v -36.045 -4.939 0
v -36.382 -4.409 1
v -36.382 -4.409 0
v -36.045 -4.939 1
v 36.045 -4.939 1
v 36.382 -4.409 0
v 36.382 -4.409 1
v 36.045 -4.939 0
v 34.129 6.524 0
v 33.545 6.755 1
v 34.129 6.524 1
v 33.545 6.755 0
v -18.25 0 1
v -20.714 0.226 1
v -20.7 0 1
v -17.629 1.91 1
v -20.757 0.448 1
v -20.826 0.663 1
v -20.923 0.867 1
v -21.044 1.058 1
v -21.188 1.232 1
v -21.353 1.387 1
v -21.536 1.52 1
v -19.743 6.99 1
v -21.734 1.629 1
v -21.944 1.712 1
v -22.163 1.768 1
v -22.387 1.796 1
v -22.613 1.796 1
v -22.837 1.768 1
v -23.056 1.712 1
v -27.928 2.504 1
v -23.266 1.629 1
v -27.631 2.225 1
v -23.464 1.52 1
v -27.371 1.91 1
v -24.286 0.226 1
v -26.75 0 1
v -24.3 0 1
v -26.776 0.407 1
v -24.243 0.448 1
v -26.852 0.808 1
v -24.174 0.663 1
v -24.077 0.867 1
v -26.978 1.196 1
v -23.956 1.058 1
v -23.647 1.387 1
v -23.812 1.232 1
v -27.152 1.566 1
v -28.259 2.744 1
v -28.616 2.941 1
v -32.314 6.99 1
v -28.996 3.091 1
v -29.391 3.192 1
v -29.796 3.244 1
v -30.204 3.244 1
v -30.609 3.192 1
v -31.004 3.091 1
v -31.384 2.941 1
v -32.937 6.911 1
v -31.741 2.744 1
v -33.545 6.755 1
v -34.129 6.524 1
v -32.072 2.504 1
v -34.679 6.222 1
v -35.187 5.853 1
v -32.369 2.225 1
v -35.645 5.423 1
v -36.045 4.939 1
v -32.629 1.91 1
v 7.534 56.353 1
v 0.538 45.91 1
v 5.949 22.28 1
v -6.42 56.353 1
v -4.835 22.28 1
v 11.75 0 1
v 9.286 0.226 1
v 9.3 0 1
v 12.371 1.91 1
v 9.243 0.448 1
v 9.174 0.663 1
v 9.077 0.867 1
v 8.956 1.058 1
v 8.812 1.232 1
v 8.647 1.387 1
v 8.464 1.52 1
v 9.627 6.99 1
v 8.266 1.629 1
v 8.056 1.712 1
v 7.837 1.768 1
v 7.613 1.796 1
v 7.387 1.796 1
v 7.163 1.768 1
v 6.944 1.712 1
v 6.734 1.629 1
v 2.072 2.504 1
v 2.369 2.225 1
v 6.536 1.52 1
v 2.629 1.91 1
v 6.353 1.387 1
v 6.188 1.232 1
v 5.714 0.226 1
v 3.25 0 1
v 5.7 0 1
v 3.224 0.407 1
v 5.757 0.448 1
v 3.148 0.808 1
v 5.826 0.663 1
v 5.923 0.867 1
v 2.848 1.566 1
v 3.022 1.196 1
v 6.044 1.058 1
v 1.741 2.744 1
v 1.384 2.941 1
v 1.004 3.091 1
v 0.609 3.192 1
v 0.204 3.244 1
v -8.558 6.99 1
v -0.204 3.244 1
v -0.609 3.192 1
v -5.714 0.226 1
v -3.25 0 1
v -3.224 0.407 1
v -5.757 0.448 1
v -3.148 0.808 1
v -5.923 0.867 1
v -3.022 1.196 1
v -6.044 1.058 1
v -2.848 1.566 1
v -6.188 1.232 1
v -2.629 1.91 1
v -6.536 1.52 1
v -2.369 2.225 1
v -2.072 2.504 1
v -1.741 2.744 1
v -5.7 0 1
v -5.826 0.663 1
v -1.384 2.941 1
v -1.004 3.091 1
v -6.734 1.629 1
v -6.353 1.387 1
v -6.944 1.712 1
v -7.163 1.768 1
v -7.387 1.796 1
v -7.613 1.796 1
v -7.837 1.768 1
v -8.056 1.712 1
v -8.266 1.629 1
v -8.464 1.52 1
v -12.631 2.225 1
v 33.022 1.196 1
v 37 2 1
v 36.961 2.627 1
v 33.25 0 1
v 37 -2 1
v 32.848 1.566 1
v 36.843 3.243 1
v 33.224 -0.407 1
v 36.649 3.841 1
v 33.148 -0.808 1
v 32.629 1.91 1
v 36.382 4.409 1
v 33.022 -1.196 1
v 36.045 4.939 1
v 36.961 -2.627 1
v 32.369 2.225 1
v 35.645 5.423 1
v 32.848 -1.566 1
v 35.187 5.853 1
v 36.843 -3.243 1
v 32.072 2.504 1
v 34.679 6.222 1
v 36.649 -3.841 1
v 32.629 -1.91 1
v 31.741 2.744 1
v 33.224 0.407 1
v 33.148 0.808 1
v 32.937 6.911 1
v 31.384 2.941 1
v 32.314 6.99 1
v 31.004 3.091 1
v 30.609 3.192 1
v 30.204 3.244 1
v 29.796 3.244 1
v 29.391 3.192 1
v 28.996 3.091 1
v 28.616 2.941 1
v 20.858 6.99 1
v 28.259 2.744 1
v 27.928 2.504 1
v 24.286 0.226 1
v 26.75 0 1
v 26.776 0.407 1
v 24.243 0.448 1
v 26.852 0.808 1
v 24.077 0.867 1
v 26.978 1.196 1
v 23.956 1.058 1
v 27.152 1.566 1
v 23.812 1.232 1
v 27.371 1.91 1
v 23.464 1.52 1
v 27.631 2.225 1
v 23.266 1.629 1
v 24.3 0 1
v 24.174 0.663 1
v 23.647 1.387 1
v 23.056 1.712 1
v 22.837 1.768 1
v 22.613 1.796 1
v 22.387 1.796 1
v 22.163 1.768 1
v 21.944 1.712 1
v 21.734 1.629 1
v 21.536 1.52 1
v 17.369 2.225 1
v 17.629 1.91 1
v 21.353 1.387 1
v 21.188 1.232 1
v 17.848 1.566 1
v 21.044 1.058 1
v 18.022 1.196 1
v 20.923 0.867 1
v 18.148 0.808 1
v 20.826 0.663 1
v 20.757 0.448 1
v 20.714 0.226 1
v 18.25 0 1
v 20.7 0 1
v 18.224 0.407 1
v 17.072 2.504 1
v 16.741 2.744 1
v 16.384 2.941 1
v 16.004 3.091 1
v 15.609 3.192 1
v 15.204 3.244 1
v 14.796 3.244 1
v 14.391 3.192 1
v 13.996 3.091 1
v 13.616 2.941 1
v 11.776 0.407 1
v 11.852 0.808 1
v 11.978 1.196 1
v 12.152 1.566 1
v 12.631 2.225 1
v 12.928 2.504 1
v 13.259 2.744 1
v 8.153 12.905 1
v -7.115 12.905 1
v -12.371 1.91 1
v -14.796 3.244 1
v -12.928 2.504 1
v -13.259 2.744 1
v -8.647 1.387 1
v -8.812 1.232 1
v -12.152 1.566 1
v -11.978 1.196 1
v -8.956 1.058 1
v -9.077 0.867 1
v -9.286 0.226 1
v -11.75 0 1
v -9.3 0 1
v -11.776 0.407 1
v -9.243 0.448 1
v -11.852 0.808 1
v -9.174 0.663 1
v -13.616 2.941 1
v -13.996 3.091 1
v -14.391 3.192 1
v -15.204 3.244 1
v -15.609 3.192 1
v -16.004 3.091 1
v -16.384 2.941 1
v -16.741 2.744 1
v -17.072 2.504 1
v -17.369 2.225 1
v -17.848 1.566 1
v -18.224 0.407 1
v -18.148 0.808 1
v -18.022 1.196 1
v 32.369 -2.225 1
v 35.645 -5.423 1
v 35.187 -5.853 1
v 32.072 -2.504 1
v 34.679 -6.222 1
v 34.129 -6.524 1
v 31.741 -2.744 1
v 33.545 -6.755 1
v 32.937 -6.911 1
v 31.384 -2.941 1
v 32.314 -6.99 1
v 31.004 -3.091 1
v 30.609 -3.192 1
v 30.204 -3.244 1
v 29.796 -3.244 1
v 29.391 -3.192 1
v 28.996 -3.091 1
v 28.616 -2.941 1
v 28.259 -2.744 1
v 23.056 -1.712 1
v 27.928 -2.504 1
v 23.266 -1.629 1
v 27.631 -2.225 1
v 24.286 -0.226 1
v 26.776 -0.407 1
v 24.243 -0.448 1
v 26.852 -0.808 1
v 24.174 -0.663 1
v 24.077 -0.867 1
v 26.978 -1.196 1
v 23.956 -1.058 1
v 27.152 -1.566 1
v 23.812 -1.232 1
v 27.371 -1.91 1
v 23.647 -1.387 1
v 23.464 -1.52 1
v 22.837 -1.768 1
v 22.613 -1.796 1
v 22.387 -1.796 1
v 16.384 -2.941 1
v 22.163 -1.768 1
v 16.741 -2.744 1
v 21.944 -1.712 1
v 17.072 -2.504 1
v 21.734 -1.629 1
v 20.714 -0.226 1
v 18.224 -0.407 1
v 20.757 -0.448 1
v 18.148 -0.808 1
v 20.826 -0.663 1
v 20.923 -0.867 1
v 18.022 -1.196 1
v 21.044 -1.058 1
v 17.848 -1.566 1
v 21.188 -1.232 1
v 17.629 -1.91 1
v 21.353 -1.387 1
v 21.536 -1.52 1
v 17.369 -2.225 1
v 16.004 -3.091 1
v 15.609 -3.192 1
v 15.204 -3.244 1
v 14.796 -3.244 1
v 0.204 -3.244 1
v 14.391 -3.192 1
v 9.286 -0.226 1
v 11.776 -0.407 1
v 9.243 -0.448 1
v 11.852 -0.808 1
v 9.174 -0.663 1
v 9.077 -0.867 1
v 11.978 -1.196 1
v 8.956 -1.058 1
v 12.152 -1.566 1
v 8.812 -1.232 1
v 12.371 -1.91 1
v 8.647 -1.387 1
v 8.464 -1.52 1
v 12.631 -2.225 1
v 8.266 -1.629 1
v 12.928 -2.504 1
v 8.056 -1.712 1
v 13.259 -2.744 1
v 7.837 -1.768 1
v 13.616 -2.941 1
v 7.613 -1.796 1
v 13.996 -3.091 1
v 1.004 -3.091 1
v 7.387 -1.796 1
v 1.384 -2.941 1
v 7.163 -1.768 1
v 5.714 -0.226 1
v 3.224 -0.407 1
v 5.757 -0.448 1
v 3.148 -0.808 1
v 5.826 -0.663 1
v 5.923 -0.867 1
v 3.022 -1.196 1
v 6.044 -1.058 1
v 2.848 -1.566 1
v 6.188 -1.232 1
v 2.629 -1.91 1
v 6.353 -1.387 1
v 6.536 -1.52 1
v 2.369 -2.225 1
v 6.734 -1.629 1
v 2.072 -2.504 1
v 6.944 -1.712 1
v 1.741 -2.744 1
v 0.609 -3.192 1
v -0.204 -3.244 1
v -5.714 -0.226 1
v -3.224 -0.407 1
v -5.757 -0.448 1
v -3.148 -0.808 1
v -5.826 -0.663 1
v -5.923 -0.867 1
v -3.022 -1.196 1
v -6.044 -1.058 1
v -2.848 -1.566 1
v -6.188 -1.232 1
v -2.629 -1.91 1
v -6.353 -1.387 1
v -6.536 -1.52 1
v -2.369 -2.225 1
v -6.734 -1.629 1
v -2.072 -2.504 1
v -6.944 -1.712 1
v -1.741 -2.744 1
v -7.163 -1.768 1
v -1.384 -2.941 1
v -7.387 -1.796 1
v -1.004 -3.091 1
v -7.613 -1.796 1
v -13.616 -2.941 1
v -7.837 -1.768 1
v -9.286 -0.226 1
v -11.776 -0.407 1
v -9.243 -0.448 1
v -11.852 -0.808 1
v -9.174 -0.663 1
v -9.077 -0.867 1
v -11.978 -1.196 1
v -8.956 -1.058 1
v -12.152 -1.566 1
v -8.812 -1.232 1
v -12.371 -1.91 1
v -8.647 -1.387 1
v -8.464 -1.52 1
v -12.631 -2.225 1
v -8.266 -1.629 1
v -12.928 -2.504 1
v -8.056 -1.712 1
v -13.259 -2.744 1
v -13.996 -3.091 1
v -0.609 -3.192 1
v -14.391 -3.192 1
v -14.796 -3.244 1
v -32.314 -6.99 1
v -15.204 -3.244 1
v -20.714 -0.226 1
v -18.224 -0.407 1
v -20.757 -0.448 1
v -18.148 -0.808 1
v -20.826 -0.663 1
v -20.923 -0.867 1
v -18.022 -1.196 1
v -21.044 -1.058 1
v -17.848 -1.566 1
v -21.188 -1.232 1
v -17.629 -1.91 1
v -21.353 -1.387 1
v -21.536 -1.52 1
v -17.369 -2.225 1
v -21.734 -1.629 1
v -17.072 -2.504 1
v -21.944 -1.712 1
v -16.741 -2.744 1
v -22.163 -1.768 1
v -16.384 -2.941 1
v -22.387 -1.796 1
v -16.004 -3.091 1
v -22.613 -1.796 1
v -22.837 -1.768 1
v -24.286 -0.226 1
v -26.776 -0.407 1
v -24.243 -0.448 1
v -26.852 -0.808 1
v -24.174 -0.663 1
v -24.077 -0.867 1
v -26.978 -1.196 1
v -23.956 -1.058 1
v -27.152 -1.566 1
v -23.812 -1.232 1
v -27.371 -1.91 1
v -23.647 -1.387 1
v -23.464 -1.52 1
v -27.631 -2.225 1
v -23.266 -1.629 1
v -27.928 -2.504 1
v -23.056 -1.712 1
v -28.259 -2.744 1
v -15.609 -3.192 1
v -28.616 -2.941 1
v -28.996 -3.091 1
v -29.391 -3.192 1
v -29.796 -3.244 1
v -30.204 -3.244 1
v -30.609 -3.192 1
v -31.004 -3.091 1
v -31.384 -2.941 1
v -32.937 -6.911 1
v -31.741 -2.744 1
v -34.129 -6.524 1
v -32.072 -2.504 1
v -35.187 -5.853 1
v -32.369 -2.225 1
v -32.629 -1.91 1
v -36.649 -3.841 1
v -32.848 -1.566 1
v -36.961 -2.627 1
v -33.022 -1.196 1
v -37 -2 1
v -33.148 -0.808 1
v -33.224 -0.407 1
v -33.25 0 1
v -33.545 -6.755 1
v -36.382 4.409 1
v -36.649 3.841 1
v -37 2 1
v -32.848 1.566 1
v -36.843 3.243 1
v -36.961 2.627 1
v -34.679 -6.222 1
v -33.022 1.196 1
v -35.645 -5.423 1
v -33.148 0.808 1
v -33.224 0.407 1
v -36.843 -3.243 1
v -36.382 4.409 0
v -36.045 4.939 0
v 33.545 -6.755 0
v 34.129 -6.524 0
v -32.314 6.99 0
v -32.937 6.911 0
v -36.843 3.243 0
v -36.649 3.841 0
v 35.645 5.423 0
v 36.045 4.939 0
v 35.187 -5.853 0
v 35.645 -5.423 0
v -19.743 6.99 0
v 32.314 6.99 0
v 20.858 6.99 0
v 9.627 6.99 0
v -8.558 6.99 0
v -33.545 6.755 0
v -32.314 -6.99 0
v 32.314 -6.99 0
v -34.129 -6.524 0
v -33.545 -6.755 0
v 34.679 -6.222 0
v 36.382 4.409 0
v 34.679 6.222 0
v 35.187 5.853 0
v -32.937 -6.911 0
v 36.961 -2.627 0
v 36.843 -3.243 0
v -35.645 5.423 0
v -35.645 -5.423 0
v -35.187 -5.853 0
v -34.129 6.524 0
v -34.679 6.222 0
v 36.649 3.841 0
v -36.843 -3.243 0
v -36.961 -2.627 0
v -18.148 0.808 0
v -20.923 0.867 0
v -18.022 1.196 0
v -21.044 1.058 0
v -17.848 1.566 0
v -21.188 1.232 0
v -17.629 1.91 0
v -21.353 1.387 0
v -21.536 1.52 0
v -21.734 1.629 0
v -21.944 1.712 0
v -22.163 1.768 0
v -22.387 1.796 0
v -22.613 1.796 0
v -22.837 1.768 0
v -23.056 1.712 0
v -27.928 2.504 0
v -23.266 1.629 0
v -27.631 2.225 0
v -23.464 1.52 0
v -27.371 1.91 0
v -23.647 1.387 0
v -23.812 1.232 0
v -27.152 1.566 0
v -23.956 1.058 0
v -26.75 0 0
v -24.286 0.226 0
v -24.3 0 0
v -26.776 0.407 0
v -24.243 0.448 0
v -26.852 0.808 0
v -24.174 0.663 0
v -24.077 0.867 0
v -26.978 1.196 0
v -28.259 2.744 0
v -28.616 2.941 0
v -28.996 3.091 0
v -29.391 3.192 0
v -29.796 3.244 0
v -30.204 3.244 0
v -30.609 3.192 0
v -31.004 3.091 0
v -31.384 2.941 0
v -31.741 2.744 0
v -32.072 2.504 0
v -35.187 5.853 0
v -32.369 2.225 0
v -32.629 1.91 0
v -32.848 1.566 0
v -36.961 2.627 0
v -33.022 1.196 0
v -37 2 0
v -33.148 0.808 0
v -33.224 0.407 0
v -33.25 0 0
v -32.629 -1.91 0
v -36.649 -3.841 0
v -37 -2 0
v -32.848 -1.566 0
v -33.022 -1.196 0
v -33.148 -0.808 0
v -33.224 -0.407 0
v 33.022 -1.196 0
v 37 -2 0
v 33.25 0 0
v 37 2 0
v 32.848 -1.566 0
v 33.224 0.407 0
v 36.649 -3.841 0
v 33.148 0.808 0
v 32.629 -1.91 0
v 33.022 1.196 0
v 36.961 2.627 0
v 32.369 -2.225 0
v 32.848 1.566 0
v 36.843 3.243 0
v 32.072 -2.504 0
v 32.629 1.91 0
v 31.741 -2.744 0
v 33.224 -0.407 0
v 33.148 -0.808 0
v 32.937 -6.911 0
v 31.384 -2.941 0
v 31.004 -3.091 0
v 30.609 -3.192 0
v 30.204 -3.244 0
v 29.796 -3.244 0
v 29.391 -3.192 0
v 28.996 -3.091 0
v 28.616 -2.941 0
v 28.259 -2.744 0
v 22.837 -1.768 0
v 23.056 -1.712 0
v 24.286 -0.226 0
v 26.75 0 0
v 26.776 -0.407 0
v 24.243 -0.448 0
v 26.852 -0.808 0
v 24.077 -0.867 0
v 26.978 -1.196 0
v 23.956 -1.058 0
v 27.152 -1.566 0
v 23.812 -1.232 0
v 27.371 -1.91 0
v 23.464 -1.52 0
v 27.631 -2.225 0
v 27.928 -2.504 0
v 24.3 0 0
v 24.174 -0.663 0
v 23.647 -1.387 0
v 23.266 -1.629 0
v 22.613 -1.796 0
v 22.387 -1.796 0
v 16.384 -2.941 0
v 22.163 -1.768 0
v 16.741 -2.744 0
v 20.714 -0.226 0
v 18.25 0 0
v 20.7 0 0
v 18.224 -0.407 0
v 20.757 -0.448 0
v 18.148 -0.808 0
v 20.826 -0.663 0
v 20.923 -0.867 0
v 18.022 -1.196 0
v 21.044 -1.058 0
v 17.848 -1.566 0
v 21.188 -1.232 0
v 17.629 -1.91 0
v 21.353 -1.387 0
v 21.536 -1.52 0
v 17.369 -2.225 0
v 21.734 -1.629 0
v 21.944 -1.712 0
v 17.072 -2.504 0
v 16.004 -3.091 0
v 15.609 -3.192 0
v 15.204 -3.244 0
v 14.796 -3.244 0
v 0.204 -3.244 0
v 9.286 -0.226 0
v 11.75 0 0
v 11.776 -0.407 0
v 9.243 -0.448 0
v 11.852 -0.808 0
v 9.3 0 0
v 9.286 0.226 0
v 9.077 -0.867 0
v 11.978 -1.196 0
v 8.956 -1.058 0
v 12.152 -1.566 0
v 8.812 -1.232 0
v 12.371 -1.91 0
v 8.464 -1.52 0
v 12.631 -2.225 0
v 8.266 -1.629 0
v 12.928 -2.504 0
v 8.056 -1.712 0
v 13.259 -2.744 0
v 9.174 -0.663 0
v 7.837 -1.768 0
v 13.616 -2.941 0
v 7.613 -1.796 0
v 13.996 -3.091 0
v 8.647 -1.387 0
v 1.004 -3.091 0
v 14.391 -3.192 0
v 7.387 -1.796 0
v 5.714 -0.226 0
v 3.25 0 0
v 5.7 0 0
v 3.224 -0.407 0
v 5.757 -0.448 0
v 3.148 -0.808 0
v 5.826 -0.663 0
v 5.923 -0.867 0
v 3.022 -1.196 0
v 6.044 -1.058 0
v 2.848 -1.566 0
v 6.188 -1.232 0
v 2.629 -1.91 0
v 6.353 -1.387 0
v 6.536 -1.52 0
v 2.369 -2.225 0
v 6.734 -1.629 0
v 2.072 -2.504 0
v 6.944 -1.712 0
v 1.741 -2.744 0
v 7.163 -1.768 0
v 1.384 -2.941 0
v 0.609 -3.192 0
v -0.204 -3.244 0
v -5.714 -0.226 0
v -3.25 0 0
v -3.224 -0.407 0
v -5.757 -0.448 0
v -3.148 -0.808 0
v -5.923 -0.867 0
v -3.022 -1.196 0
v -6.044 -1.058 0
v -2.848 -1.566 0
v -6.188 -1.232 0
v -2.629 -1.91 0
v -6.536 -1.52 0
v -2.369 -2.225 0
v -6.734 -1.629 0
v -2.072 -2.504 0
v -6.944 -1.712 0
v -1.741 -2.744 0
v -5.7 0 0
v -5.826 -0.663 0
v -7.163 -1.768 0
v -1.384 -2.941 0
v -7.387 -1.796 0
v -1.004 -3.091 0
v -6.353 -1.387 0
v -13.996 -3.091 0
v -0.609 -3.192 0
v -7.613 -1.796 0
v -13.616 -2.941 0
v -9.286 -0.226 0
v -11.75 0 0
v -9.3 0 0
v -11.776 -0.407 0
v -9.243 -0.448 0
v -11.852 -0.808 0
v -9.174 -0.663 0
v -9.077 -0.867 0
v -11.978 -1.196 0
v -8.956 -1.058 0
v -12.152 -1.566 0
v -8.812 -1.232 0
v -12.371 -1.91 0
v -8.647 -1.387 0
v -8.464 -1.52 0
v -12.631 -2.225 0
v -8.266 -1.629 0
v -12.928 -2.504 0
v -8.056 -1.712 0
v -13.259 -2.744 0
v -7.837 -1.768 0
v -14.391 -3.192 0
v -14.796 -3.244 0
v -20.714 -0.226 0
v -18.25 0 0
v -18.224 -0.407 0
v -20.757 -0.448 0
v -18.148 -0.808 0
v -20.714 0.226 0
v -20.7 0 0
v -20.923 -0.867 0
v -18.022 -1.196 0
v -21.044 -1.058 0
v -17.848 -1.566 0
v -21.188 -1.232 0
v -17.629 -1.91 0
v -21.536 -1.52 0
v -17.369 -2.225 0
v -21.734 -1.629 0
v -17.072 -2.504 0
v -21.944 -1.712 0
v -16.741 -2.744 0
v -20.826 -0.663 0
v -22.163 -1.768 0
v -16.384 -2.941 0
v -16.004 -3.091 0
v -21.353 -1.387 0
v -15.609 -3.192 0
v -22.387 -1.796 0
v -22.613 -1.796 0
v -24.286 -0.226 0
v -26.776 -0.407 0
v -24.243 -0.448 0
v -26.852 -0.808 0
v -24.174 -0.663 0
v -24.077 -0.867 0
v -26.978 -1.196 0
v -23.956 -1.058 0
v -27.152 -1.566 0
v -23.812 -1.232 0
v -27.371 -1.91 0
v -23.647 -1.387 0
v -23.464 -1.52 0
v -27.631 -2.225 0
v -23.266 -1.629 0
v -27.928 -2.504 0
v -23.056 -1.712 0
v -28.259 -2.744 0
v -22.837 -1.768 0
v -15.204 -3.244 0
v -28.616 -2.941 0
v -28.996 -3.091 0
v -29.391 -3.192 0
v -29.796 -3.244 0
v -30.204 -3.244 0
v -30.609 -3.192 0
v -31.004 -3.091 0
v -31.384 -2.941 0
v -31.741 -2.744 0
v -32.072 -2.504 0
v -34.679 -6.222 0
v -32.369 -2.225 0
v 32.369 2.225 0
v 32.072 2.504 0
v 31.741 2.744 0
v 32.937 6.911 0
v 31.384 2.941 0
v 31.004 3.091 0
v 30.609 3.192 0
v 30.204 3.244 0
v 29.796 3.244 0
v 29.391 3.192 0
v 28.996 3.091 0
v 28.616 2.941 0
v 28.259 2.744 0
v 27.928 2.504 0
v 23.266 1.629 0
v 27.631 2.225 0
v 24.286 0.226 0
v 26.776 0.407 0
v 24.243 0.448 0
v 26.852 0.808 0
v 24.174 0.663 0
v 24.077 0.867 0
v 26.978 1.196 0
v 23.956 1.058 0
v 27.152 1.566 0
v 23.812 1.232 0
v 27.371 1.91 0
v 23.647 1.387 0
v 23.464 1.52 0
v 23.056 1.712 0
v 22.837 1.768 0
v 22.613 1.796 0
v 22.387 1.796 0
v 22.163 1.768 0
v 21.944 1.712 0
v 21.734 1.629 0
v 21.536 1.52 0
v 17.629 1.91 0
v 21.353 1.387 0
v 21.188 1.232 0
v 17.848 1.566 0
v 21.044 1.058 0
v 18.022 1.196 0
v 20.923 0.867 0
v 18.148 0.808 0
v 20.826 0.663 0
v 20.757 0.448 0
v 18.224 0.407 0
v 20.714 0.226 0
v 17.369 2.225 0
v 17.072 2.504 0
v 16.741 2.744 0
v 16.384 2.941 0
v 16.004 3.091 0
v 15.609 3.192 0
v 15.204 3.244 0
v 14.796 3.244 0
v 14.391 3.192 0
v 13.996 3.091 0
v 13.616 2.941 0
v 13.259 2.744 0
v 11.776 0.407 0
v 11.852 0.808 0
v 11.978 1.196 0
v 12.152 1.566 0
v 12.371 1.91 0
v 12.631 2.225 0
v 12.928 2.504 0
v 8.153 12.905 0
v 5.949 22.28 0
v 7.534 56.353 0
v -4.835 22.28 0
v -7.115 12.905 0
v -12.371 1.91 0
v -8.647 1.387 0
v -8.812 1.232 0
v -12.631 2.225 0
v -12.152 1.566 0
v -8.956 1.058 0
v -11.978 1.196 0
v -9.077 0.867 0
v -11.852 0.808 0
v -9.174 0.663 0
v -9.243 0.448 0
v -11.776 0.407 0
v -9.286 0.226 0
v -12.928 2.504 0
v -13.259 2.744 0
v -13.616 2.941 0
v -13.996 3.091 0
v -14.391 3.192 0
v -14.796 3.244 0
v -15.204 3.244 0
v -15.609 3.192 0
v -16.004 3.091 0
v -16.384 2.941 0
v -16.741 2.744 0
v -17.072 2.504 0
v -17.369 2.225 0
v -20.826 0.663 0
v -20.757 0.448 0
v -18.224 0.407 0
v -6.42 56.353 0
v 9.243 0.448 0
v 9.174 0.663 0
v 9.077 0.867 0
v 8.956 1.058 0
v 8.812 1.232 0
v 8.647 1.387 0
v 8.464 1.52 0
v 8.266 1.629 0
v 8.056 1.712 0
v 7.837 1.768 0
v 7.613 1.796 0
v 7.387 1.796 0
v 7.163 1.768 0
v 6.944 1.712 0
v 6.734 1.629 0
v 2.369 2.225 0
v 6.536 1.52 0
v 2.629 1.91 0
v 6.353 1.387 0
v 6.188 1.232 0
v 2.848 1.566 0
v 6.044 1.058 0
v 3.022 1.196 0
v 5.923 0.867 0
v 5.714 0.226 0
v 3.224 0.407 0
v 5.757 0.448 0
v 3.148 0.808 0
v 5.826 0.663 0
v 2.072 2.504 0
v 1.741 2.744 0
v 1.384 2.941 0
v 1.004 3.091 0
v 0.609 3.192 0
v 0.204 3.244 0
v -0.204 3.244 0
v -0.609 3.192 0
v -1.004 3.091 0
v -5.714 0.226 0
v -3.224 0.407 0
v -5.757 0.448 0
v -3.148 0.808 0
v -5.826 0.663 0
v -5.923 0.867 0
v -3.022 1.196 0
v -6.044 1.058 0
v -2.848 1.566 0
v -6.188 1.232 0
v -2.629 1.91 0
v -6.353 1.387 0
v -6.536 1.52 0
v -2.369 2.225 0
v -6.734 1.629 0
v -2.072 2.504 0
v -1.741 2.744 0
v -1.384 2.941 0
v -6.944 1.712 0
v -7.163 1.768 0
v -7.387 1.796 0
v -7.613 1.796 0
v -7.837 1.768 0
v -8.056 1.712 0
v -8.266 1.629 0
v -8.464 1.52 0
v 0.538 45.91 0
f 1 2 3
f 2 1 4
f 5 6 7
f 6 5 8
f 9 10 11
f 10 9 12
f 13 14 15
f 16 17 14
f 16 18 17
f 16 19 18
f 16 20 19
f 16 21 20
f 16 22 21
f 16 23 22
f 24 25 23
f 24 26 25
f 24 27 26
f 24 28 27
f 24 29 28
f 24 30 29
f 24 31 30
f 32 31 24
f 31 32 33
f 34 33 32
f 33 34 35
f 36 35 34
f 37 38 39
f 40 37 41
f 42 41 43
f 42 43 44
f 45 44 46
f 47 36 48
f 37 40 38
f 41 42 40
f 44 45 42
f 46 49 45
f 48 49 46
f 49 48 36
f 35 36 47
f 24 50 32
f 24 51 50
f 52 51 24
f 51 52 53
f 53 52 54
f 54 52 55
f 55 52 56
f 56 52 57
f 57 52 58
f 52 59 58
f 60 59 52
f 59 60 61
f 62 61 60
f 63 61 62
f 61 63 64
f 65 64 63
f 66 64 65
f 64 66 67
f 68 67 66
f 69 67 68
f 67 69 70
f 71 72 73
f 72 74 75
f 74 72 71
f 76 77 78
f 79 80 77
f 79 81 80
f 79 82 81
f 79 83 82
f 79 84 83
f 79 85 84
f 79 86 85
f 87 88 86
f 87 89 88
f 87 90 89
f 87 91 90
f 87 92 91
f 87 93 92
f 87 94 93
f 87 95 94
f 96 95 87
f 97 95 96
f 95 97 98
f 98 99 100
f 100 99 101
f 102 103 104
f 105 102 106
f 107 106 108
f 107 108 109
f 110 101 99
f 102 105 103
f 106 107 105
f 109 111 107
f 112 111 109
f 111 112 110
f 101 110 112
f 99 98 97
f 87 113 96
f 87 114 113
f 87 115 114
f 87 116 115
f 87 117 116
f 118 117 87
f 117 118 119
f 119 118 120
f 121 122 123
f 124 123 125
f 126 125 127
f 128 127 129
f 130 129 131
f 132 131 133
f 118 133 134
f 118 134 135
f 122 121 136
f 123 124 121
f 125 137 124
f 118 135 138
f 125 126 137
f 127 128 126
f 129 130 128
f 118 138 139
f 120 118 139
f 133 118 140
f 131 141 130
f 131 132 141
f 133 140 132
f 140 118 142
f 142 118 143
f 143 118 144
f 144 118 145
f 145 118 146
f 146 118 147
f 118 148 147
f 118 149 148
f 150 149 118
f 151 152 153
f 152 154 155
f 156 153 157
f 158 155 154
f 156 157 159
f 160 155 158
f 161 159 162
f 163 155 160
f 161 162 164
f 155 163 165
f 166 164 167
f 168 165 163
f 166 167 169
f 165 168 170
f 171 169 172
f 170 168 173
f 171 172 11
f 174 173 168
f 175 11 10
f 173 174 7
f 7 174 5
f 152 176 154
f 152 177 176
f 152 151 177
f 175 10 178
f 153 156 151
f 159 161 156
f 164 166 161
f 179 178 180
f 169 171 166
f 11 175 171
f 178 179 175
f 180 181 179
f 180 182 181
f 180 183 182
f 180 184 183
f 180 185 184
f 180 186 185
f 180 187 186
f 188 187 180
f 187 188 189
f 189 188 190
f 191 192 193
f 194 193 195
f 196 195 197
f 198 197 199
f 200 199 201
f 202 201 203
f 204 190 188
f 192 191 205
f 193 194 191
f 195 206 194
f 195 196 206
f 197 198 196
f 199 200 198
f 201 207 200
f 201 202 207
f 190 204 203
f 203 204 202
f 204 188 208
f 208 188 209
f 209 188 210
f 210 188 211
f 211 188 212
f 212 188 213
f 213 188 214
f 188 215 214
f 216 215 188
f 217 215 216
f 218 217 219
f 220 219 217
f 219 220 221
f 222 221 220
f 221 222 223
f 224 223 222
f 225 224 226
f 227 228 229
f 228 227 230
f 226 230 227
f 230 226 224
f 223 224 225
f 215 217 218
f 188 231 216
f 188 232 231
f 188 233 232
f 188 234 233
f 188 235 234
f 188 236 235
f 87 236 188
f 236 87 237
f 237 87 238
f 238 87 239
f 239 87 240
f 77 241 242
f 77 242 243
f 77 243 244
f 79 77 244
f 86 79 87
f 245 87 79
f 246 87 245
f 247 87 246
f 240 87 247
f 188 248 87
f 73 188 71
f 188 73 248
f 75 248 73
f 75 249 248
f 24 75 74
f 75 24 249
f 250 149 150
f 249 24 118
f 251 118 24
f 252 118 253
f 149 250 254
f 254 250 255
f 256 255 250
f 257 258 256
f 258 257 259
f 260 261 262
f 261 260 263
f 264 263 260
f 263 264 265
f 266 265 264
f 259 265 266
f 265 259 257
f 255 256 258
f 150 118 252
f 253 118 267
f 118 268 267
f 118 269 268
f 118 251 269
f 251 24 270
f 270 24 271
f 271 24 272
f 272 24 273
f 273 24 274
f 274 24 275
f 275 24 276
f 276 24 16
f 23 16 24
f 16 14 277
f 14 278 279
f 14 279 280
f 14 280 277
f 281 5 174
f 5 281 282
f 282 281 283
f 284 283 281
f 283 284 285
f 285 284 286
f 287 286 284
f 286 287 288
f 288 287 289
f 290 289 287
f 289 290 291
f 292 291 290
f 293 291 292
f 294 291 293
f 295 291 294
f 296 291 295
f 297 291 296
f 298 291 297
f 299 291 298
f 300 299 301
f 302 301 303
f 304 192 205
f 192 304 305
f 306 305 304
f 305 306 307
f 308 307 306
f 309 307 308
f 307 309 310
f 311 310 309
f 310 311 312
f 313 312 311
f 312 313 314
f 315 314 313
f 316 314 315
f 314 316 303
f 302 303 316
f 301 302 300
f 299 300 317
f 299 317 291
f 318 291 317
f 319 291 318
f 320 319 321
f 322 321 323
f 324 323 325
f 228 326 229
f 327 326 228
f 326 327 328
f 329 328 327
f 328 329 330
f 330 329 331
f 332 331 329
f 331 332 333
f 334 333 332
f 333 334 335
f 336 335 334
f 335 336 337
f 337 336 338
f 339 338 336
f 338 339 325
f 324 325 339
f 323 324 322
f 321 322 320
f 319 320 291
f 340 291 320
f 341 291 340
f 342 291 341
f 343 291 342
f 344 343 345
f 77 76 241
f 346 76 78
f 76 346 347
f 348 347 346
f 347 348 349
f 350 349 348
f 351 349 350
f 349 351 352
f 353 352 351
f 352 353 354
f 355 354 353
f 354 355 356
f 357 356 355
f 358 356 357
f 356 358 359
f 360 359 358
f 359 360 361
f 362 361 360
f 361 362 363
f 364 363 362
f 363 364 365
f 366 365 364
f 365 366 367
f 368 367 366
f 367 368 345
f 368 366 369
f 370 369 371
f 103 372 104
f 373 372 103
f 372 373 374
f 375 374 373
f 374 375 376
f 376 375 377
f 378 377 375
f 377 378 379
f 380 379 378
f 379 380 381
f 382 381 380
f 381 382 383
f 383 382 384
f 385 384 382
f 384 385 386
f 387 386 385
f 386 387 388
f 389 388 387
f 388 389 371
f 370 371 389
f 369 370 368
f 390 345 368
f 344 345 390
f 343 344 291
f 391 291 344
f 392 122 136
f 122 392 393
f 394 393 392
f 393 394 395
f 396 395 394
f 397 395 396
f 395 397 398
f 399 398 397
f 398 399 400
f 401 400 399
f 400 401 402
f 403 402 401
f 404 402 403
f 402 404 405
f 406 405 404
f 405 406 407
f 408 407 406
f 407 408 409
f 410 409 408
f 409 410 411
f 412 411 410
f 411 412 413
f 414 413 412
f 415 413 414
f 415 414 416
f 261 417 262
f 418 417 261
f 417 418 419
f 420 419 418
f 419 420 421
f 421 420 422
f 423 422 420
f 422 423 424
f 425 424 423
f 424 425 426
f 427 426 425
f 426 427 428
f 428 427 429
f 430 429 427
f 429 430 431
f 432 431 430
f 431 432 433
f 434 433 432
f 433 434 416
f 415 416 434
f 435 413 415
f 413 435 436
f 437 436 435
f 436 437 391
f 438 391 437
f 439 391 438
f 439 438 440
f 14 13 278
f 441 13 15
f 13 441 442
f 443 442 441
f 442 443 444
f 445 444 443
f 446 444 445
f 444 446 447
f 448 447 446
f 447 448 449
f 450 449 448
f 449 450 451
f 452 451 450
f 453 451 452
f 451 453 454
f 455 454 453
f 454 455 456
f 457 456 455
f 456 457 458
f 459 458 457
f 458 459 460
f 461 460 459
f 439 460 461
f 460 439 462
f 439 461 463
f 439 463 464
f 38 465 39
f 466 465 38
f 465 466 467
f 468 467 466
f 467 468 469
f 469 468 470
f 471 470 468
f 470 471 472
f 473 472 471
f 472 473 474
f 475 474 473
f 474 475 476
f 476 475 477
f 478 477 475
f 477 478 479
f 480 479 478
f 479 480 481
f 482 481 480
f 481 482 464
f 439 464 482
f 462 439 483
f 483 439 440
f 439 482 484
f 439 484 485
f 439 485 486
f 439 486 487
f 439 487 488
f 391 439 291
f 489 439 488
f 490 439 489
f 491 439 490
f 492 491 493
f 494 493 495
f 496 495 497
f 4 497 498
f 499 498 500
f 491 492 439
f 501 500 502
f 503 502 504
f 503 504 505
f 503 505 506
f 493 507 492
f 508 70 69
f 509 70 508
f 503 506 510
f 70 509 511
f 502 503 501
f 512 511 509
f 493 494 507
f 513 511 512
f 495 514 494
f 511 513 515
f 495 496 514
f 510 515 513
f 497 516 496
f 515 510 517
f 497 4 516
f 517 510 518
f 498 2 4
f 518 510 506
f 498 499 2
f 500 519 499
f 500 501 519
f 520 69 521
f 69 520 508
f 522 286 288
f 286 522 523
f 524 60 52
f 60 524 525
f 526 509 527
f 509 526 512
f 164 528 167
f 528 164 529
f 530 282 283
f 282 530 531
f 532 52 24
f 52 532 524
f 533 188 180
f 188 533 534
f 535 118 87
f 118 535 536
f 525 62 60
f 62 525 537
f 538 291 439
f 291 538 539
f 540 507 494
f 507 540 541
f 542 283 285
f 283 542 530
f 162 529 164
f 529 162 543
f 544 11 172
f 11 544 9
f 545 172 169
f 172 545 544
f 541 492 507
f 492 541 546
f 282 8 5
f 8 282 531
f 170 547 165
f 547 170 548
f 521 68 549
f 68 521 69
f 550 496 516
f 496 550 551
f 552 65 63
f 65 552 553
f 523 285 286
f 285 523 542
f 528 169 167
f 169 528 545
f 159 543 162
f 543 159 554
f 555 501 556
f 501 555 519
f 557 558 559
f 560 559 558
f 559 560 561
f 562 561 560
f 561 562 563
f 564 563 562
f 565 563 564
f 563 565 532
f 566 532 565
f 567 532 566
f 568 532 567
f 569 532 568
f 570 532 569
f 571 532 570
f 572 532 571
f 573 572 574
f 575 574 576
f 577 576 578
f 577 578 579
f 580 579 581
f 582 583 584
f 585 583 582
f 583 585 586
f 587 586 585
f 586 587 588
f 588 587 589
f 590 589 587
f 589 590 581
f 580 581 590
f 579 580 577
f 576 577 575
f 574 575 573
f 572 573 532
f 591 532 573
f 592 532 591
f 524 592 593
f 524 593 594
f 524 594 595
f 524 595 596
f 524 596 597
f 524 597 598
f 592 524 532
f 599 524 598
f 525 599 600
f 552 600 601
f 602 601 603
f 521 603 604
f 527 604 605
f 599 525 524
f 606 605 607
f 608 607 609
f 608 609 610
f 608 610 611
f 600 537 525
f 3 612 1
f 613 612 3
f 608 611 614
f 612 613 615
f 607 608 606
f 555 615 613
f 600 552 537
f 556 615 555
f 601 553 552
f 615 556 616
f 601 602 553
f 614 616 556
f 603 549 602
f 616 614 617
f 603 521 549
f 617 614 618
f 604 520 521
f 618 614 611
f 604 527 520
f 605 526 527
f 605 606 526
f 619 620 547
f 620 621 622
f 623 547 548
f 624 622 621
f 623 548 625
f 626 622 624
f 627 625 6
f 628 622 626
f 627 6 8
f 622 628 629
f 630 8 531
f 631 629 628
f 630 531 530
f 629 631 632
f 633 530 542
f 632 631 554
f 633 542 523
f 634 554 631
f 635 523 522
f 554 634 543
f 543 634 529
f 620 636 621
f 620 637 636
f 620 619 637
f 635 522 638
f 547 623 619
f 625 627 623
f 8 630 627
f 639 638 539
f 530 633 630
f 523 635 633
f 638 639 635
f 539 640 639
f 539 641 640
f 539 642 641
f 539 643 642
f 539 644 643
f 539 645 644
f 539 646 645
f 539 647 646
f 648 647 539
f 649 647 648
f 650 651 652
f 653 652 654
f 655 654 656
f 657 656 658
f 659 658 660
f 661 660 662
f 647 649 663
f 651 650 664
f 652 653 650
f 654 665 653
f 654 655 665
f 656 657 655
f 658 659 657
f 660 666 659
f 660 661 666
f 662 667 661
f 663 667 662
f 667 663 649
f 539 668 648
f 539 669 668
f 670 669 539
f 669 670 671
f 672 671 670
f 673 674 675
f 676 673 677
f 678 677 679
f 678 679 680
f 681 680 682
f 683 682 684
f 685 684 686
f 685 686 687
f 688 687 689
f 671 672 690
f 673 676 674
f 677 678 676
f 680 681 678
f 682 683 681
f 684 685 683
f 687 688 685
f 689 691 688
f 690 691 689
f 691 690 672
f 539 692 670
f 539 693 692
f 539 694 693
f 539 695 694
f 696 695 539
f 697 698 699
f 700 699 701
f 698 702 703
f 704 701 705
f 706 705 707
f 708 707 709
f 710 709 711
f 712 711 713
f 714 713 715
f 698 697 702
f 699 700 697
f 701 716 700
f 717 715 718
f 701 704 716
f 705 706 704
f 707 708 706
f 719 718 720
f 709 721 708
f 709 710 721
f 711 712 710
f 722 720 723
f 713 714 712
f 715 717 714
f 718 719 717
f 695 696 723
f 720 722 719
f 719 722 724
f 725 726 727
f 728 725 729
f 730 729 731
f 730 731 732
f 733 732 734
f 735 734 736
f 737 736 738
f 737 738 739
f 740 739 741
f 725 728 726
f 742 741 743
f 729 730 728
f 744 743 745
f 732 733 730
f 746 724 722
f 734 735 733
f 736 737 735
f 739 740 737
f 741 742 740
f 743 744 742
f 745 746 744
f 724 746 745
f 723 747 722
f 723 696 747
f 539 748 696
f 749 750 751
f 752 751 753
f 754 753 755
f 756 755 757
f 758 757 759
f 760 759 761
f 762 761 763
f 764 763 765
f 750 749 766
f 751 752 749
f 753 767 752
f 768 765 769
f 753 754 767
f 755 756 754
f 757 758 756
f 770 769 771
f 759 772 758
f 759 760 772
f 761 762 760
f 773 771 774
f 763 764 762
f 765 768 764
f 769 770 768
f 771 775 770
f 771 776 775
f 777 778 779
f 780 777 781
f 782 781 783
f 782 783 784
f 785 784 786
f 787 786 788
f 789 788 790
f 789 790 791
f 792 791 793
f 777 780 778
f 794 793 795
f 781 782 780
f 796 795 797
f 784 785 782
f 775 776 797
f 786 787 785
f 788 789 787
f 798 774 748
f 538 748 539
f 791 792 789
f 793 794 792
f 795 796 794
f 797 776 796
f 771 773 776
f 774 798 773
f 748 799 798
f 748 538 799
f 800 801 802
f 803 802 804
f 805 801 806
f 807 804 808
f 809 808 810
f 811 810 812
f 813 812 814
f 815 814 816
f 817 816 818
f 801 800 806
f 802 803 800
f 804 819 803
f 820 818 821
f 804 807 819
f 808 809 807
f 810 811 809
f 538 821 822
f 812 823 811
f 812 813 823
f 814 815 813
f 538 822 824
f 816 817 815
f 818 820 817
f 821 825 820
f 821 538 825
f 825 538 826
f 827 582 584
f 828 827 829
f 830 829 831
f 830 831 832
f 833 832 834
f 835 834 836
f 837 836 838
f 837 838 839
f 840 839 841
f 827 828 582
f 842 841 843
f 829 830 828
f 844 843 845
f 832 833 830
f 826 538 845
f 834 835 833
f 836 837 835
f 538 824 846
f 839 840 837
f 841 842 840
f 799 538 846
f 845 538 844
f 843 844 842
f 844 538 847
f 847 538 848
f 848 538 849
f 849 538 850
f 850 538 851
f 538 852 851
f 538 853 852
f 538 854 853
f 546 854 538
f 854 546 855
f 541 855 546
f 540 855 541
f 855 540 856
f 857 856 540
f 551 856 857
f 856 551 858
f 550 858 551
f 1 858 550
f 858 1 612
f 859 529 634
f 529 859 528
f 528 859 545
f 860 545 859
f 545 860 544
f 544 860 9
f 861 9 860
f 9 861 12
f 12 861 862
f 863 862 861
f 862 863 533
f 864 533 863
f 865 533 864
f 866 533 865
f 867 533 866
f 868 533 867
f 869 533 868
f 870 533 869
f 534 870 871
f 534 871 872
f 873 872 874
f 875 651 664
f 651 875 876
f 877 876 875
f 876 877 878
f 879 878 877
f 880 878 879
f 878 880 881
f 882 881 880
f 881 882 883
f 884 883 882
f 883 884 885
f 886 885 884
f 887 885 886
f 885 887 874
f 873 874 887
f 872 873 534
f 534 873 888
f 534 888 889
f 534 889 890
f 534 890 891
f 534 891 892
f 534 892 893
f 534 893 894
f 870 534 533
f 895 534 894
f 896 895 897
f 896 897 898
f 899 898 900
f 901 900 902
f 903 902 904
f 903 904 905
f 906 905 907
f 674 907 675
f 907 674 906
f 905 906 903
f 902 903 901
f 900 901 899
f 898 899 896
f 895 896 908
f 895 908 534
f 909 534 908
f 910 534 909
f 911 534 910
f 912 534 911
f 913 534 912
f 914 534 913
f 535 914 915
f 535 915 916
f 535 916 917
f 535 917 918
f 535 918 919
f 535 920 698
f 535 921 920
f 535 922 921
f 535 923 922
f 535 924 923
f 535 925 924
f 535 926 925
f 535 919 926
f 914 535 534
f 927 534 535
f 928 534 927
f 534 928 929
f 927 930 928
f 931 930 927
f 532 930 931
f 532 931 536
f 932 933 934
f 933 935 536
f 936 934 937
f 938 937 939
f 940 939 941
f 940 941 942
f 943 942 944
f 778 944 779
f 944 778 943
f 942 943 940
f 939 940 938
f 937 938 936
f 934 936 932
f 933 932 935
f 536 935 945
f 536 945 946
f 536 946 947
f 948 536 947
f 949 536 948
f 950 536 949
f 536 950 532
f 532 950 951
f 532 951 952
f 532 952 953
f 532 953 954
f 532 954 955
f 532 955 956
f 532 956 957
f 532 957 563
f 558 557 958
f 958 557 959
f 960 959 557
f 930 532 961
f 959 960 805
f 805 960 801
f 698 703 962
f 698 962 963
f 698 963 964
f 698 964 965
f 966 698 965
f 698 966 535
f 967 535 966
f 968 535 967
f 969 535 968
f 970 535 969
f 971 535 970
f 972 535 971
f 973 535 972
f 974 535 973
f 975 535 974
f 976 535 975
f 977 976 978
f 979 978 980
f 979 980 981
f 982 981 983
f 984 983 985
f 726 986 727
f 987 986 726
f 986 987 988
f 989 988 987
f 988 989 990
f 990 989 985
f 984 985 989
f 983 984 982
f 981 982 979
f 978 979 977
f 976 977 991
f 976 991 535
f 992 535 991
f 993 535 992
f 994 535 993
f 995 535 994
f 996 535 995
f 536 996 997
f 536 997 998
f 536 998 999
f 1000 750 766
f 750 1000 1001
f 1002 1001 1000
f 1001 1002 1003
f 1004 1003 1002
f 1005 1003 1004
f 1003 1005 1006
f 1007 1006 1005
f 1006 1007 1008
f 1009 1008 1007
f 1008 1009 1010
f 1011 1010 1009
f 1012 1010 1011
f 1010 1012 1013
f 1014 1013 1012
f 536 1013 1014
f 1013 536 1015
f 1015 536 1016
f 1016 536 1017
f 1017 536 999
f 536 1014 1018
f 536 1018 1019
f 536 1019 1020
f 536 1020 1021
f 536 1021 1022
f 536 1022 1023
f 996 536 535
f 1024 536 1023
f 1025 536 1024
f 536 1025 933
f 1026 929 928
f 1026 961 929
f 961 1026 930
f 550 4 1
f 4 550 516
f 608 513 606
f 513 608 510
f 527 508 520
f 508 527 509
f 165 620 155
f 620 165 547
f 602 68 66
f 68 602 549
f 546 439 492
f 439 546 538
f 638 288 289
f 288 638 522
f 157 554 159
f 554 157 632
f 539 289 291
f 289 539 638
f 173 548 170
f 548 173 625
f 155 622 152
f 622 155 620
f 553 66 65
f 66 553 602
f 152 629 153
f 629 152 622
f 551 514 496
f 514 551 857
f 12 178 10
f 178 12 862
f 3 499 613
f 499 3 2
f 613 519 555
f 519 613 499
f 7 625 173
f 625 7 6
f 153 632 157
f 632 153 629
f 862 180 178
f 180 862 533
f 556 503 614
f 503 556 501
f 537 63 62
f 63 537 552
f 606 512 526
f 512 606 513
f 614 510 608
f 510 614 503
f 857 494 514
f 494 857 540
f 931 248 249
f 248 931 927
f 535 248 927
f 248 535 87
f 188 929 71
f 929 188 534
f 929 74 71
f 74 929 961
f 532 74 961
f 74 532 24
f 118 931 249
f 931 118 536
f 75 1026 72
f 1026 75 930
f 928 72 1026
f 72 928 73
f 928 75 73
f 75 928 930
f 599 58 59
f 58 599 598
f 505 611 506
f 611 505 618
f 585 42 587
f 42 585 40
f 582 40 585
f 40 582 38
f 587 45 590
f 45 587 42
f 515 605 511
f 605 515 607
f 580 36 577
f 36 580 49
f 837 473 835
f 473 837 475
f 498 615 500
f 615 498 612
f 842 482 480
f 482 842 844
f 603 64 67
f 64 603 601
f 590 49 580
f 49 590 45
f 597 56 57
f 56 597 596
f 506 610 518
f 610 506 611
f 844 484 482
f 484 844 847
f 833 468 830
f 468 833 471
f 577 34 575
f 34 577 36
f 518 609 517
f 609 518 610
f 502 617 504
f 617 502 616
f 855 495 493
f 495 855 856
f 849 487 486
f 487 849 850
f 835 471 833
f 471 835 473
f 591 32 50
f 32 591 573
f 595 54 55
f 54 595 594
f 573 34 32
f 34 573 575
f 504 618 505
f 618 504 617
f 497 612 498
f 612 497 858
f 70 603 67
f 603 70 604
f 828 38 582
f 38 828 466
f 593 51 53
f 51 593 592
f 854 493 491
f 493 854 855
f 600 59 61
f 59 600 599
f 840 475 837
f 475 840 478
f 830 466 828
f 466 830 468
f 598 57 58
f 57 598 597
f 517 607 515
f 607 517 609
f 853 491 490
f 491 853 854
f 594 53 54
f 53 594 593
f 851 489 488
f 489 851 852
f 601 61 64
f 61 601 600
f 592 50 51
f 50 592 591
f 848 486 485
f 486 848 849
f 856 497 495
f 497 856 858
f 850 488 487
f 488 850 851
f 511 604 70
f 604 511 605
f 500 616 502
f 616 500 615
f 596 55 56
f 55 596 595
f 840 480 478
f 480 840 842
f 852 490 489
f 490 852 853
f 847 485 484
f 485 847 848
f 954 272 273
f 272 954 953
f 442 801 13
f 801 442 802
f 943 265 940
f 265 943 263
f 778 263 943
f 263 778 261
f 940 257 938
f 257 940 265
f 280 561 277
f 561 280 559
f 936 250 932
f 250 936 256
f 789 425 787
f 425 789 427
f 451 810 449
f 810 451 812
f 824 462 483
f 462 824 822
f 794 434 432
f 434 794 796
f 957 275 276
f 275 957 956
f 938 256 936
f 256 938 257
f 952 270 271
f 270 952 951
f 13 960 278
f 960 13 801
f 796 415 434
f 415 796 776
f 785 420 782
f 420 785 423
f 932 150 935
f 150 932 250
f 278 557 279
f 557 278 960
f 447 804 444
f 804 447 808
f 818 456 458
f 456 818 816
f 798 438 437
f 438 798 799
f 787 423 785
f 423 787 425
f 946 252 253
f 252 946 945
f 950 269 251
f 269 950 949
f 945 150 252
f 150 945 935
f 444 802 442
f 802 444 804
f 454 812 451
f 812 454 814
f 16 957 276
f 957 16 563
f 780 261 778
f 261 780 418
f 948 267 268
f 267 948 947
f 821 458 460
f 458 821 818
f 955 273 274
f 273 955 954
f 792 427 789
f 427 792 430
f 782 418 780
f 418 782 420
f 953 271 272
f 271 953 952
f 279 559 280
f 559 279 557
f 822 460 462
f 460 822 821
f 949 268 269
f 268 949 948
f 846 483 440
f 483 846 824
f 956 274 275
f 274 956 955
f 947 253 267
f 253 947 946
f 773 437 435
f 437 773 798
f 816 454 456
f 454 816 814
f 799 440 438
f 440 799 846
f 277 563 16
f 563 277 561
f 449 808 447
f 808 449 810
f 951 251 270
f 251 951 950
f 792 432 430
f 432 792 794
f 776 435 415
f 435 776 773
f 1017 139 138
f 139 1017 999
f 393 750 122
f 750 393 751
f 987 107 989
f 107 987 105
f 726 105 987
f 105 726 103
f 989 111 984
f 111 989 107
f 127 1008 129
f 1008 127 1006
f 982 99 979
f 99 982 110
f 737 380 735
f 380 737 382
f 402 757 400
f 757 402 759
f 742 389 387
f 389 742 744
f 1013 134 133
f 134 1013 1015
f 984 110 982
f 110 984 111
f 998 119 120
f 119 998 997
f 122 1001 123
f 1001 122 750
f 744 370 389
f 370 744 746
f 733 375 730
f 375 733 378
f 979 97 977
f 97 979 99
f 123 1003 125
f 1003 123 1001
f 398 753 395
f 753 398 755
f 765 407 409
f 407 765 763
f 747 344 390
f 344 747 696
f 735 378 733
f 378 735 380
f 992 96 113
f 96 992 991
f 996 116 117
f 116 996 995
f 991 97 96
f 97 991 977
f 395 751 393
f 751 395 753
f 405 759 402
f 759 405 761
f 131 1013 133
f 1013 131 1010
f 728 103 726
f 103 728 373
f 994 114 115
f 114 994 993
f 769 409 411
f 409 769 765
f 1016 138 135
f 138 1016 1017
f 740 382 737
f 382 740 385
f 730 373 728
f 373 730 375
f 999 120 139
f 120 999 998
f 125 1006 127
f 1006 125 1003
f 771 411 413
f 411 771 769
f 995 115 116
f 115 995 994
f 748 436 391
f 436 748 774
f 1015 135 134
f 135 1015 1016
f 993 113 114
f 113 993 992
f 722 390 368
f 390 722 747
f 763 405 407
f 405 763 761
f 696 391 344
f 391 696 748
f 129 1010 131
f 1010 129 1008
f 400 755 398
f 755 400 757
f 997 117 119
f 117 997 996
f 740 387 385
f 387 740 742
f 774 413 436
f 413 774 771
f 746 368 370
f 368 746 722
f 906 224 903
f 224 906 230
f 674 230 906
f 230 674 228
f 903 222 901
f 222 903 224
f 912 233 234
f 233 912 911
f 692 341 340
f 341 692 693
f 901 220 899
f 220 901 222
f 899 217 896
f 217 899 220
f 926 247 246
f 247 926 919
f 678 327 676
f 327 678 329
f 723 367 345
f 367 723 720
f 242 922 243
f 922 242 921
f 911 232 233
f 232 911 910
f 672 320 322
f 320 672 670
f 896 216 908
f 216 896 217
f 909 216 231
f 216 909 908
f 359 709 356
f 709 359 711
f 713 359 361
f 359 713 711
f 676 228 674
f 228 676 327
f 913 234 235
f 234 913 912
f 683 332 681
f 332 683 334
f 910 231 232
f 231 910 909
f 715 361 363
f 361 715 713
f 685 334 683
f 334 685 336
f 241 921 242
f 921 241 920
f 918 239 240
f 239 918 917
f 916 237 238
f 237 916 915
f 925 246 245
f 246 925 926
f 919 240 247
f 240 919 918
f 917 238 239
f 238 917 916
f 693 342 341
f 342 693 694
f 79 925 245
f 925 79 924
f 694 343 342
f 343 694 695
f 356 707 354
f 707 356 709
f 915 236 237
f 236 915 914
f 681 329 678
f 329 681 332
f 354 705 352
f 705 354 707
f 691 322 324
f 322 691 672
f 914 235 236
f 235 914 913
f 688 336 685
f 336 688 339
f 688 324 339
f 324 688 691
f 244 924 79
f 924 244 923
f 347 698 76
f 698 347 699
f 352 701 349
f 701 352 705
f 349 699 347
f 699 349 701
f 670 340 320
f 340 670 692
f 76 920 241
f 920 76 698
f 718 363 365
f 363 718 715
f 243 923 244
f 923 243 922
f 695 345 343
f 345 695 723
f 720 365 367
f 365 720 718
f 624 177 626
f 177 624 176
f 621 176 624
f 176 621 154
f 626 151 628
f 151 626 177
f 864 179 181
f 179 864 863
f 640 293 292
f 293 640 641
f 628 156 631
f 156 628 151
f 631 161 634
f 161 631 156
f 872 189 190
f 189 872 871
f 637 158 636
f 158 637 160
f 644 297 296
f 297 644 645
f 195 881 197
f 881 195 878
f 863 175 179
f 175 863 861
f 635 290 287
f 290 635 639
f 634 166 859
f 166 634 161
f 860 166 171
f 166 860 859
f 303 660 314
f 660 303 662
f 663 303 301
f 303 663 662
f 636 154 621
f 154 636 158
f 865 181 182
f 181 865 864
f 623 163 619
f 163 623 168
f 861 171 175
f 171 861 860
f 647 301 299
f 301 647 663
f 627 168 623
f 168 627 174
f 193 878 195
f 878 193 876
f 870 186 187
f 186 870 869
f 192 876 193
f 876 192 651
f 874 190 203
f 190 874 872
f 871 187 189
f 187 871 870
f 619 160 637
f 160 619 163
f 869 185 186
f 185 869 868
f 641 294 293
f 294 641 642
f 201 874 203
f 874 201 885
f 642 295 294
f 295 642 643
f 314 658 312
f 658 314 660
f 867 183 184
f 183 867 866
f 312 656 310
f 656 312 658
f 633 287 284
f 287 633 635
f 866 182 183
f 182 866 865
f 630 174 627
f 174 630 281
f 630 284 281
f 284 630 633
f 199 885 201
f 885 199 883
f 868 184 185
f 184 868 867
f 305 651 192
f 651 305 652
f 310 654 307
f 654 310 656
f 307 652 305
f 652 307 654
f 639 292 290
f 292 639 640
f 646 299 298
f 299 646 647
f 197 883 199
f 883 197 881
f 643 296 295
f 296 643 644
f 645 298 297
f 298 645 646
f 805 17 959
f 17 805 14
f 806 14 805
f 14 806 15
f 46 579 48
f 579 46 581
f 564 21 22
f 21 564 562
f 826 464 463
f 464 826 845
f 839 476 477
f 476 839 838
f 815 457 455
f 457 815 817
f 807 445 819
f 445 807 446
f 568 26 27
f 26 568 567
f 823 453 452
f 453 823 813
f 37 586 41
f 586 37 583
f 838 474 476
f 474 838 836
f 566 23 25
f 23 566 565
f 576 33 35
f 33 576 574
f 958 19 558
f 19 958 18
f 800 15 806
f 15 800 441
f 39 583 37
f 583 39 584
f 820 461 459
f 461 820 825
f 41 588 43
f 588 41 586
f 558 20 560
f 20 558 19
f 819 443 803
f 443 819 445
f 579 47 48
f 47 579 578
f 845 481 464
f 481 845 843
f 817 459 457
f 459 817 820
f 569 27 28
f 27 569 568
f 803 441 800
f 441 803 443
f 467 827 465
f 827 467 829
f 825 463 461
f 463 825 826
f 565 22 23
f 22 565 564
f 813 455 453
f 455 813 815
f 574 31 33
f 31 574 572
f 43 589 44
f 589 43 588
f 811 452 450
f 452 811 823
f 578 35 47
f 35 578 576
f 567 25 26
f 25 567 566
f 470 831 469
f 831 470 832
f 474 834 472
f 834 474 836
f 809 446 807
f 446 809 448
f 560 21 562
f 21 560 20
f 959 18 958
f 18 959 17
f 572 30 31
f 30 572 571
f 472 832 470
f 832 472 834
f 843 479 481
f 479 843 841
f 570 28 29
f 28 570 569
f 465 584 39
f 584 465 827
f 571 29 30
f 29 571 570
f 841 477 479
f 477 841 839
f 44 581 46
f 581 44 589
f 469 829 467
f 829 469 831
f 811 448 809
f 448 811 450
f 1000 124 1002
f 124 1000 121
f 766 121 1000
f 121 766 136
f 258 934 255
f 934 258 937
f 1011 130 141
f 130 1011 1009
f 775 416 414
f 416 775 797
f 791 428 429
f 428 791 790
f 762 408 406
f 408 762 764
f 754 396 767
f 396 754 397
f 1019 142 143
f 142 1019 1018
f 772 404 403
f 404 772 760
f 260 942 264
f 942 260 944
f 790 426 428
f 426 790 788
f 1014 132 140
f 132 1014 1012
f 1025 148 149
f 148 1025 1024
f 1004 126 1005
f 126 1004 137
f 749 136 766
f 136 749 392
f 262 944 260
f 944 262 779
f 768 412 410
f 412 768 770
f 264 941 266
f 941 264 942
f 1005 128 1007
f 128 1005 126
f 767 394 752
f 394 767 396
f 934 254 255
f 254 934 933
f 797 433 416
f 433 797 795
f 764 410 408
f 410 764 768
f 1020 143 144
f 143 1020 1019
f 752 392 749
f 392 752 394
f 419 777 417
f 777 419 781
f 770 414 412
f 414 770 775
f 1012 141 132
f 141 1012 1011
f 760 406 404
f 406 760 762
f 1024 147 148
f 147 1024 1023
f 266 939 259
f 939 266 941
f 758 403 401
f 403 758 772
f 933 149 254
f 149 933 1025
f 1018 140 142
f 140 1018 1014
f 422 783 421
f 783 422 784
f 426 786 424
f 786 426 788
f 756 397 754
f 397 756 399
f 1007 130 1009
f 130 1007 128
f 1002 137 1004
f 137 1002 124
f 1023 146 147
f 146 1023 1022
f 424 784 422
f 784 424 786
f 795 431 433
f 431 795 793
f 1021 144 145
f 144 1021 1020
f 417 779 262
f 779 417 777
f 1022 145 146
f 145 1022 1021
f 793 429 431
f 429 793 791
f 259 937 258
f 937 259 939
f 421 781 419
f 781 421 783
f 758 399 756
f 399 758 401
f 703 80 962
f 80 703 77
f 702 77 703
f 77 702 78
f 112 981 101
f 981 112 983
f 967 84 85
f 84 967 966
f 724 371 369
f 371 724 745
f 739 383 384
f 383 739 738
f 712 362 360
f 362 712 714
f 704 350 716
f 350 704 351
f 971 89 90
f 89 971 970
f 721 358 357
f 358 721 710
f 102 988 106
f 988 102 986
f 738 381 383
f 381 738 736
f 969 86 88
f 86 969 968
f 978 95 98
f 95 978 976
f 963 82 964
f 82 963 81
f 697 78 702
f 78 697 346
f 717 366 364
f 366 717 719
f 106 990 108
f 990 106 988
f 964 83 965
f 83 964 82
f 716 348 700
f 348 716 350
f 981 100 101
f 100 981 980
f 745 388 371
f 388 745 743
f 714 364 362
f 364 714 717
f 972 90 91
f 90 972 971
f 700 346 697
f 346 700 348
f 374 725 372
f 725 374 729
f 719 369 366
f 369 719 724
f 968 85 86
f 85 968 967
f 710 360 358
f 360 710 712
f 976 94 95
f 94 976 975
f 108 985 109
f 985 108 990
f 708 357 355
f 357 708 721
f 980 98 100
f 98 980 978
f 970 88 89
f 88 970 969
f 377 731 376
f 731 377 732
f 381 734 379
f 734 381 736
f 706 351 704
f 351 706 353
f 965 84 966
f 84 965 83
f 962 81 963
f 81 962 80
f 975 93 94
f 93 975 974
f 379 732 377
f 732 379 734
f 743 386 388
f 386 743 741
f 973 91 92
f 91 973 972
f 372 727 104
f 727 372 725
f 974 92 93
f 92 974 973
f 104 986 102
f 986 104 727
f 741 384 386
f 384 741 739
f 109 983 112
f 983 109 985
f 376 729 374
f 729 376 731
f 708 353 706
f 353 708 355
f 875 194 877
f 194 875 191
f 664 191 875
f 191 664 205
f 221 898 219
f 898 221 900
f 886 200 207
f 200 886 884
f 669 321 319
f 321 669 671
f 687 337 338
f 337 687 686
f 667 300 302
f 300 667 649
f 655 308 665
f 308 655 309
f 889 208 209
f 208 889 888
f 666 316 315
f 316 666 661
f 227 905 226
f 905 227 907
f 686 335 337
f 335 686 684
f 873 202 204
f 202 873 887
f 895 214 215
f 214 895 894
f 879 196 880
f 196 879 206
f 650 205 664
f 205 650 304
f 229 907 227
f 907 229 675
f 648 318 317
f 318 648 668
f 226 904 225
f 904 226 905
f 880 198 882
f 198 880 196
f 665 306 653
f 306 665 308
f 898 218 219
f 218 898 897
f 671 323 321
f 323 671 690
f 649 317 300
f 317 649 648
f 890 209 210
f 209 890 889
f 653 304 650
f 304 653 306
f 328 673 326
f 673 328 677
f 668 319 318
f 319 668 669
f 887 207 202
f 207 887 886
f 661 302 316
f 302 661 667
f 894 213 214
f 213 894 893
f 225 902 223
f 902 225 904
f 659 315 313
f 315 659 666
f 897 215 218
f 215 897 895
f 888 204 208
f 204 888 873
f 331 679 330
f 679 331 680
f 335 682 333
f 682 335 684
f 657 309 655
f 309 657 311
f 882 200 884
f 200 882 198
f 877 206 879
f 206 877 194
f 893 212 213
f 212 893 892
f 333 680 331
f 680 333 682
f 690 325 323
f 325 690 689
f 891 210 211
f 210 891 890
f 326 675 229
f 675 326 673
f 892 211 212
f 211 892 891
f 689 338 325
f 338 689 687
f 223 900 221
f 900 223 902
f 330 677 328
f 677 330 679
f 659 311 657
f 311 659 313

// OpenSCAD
$fn = 50;


difference() {
	union() {
		hull() {
			translate(v = [-32.0000000000, 2.0000000000, 0]) {
				cylinder(h = 1, r = 5);
			}
			translate(v = [32.0000000000, 2.0000000000, 0]) {
				cylinder(h = 1, r = 5);
			}
			translate(v = [-32.0000000000, -2.0000000000, 0]) {
				cylinder(h = 1, r = 5);
			}
			translate(v = [32.0000000000, -2.0000000000, 0]) {
				cylinder(h = 1, r = 5);
			}
		}
		translate(v = [0, 55, 0]) {
			linear_extrude(height = 1) {
				text(font = "DejaVu Sans Mono:style=Bold", halign = "center", size = 57.0000000000, text = "A", valign = "top");
			}
		}
	}
	union() {
		translate(v = [-30.0000000000, 0.0000000000, 0]) {
			translate(v = [0, 0, -100]) {
				cylinder(h = 200, r = 3.2500000000);
			}
		}
		translate(v = [-15.0000000000, 0.0000000000, 0]) {
			translate(v = [0, 0, -100]) {
				cylinder(h = 200, r = 3.2500000000);
			}
		}
		translate(v = [0, 0, -100]) {
			cylinder(h = 200, r = 3.2500000000);
		}
		translate(v = [15.0000000000, 0.0000000000, 0]) {
			translate(v = [0, 0, -100]) {
				cylinder(h = 200, r = 3.2500000000);
			}
		}
		translate(v = [30.0000000000, 0.0000000000, 0]) {
			translate(v = [0, 0, -100]) {
				cylinder(h = 200, r = 3.2500000000);
			}
		}
		translate(v = [-30.0000000000, 0.0000000000, 0]) {
			translate(v = [0, 0, -100]) {
				cylinder(h = 200, r = 1.8000000000);
			}
		}
		translate(v = [-22.5000000000, 0.0000000000, 0]) {
			translate(v = [0, 0, -100]) {
				cylinder(h = 200, r = 1.8000000000);
			}
		}
		translate(v = [-15.0000000000, 0.0000000000, 0]) {
			translate(v = [0, 0, -100]) {
				cylinder(h = 200, r = 1.8000000000);
			}
		}
		translate(v = [-7.5000000000, 0.0000000000, 0]) {
			translate(v = [0, 0, -100]) {
				cylinder(h = 200, r = 1.8000000000);
			}
		}
		translate(v = [0, 0, -100]) {
			cylinder(h = 200, r = 1.8000000000);
		}
		translate(v = [7.5000000000, 0.0000000000, 0]) {
			translate(v = [0, 0, -100]) {
				cylinder(h = 200, r = 1.8000000000);
			}
		}
		translate(v = [15.0000000000, 0.0000000000, 0]) {
			translate(v = [0, 0, -100]) {
				cylinder(h = 200, r = 1.8000000000);
			}
		}
		translate(v = [22.5000000000, 0.0000000000, 0]) {
			translate(v = [0, 0, -100]) {
				cylinder(h = 200, r = 1.8000000000);
			}
		}
		translate(v = [30.0000000000, 0.0000000000, 0]) {
			translate(v = [0, 0, -100]) {
				cylinder(h = 200, r = 1.8000000000);
			}
		}
	}
}
